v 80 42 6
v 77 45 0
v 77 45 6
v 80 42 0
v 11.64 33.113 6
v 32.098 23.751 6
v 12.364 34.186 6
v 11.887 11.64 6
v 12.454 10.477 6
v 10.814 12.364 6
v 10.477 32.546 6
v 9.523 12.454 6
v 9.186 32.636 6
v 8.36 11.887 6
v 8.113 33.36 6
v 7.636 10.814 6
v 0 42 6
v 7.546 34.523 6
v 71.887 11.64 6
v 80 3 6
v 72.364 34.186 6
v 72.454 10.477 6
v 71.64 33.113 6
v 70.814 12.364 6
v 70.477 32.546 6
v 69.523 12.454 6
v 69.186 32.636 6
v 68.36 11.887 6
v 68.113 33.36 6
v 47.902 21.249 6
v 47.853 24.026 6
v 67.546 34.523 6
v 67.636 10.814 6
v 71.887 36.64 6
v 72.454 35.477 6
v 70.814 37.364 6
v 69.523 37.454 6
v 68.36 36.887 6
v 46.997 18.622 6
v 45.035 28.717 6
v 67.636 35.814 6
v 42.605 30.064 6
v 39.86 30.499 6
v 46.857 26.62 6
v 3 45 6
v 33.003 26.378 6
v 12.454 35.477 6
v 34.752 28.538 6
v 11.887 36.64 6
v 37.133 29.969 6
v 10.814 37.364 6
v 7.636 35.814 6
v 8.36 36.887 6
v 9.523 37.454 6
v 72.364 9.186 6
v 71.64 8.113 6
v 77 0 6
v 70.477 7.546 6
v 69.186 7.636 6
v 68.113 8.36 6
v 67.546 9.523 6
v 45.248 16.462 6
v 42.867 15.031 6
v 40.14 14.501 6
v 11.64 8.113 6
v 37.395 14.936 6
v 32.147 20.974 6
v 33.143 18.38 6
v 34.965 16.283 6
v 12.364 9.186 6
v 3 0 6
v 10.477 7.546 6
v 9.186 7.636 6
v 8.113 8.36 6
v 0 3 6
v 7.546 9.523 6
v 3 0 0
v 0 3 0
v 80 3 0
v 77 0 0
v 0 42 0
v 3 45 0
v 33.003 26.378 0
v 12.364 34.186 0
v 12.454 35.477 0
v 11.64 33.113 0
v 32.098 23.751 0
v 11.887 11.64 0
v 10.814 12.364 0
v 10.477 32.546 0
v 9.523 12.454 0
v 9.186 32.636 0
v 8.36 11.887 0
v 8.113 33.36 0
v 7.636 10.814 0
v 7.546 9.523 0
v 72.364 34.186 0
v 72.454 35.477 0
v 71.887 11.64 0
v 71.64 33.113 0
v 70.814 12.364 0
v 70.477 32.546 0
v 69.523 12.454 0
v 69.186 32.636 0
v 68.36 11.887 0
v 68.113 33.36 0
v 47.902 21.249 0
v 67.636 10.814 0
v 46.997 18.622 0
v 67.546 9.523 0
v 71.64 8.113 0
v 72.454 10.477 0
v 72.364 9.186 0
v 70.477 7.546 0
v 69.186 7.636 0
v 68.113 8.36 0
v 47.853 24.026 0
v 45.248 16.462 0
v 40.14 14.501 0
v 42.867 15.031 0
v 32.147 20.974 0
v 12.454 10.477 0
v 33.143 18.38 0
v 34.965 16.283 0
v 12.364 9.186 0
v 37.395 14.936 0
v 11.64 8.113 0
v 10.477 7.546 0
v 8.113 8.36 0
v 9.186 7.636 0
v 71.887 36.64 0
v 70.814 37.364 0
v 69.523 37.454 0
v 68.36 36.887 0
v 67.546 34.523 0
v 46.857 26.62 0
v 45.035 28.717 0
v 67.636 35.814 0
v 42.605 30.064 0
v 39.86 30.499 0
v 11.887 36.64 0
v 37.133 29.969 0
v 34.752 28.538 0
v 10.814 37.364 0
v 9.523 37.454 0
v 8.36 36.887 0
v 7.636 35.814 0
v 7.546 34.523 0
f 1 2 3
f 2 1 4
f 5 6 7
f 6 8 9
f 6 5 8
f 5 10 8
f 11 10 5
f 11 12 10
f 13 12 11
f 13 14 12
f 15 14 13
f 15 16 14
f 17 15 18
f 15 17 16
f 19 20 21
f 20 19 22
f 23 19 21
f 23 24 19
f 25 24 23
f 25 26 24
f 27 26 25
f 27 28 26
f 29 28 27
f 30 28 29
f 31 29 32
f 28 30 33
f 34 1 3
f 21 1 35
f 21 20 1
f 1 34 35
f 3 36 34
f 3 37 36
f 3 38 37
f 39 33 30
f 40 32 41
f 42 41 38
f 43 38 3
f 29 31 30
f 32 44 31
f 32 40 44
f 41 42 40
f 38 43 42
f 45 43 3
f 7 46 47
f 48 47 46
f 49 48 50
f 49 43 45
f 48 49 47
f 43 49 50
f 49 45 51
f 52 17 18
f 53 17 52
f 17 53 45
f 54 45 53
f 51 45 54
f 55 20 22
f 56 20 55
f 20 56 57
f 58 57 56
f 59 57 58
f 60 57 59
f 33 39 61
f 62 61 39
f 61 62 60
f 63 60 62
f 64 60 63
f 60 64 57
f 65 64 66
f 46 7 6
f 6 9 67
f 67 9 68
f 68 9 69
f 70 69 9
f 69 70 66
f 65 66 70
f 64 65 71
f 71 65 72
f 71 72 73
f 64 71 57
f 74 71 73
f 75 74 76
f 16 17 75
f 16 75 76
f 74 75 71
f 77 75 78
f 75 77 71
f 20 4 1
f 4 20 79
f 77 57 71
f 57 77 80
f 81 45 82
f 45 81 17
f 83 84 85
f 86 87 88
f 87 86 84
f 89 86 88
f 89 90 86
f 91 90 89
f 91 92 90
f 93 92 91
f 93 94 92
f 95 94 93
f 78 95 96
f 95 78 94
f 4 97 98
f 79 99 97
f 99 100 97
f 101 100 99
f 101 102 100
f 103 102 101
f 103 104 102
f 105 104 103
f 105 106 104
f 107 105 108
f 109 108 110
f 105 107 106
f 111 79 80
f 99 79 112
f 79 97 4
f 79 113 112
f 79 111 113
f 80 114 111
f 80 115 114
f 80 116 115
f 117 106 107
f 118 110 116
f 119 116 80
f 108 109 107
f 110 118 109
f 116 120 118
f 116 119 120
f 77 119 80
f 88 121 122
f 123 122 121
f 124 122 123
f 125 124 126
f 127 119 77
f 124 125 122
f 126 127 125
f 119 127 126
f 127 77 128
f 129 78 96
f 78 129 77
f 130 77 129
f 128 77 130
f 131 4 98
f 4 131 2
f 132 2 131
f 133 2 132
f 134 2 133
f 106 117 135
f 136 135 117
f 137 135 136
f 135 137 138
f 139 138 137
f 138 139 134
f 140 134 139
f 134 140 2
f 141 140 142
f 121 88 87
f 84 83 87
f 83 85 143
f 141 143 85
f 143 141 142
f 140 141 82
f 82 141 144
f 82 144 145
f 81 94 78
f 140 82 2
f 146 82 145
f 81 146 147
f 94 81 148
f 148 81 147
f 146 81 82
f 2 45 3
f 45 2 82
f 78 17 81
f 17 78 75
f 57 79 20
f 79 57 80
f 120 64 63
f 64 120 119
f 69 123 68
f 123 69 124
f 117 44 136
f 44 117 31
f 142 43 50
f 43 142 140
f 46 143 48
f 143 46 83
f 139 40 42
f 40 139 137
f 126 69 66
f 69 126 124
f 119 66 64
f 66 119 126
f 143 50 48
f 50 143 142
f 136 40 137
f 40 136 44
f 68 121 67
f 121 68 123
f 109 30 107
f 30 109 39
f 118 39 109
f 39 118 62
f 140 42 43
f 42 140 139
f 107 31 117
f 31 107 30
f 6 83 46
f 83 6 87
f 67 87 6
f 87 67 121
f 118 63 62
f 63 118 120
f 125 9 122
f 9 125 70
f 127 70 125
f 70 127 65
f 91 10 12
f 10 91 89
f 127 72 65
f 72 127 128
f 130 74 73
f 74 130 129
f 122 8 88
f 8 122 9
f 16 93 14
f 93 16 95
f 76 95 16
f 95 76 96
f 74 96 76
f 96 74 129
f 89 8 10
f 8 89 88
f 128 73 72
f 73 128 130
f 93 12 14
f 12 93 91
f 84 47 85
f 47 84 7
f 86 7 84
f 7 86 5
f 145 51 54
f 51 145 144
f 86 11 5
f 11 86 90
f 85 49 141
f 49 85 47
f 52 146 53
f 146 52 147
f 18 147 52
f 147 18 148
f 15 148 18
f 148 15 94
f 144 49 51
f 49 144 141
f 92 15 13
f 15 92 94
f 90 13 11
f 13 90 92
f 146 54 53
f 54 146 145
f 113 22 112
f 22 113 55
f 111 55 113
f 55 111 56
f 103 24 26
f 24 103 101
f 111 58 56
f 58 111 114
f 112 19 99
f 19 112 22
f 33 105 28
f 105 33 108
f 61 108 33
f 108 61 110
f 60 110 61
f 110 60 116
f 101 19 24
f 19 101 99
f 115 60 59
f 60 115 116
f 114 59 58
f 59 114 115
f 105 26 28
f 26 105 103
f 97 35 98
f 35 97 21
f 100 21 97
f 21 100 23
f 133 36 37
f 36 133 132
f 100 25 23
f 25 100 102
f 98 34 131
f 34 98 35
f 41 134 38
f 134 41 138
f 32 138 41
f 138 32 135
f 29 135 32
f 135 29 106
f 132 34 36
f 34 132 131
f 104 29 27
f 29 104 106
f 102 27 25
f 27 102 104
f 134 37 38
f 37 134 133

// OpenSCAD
$fn = 32;

// ----------------------------------------------------------------------
// Spacer plate: rect 80 x 45
// ----------------------------------------------------------------------

// --- parameters (mm) ---
bore_r = 8;               // centre bore radius
bolt_r = 2.5;             // bolt hole radius
plate_t = 6;              // plate thickness, Z (extrusion height)
plate_l = 80;             // plate length, X
plate_w = 45;             // plate width, Y
inset = 10;               // corner hole inset

profile = [[3, 0], [77, 0], [80, 3], [80, 42], [77, 45], [3, 45], [0, 42], [0, 3]];  // primary outline, 8 points, counter clockwise
void_1 = [[47.853, 24.026], [46.857, 26.62], [45.035, 28.717], [42.605, 30.064], [39.86, 30.499], [37.133, 29.969], [34.752, 28.538], [33.003, 26.378], [32.098, 23.751], [32.147, 20.974], [33.143, 18.38], [34.965, 16.283], [37.395, 14.936], [40.14, 14.501], [42.867, 15.031], [45.248, 16.462], [46.997, 18.622], [47.902, 21.249]];  // centre bore, 18 points
void_2 = [[12.454, 10.477], [11.887, 11.64], [10.814, 12.364], [9.523, 12.454], [8.36, 11.887], [7.636, 10.814], [7.546, 9.523], [8.113, 8.36], [9.186, 7.636], [10.477, 7.546], [11.64, 8.113], [12.364, 9.186]];  // corner hole, 12 points
void_3 = [[12.454, 35.477], [11.887, 36.64], [10.814, 37.364], [9.523, 37.454], [8.36, 36.887], [7.636, 35.814], [7.546, 34.523], [8.113, 33.36], [9.186, 32.636], [10.477, 32.546], [11.64, 33.113], [12.364, 34.186]];  // corner hole, 12 points
void_4 = [[72.454, 10.477], [71.887, 11.64], [70.814, 12.364], [69.523, 12.454], [68.36, 11.887], [67.636, 10.814], [67.546, 9.523], [68.113, 8.36], [69.186, 7.636], [70.477, 7.546], [71.64, 8.113], [72.364, 9.186]];  // corner hole, 12 points
void_5 = [[72.454, 35.477], [71.887, 36.64], [70.814, 37.364], [69.523, 37.454], [68.36, 36.887], [67.636, 35.814], [67.546, 34.523], [68.113, 33.36], [69.186, 32.636], [70.477, 32.546], [71.64, 33.113], [72.364, 34.186]];  // corner hole, 12 points

// --- the one profile operation ---
difference() {
  linear_extrude(height = plate_t) polygon(points = profile);
  translate([0, 0, -1])
    linear_extrude(height = plate_t + 2) polygon(points = void_1);
  translate([0, 0, -1])
    linear_extrude(height = plate_t + 2) polygon(points = void_2);
  translate([0, 0, -1])
    linear_extrude(height = plate_t + 2) polygon(points = void_3);
  translate([0, 0, -1])
    linear_extrude(height = plate_t + 2) polygon(points = void_4);
  translate([0, 0, -1])
    linear_extrude(height = plate_t + 2) polygon(points = void_5);
}
